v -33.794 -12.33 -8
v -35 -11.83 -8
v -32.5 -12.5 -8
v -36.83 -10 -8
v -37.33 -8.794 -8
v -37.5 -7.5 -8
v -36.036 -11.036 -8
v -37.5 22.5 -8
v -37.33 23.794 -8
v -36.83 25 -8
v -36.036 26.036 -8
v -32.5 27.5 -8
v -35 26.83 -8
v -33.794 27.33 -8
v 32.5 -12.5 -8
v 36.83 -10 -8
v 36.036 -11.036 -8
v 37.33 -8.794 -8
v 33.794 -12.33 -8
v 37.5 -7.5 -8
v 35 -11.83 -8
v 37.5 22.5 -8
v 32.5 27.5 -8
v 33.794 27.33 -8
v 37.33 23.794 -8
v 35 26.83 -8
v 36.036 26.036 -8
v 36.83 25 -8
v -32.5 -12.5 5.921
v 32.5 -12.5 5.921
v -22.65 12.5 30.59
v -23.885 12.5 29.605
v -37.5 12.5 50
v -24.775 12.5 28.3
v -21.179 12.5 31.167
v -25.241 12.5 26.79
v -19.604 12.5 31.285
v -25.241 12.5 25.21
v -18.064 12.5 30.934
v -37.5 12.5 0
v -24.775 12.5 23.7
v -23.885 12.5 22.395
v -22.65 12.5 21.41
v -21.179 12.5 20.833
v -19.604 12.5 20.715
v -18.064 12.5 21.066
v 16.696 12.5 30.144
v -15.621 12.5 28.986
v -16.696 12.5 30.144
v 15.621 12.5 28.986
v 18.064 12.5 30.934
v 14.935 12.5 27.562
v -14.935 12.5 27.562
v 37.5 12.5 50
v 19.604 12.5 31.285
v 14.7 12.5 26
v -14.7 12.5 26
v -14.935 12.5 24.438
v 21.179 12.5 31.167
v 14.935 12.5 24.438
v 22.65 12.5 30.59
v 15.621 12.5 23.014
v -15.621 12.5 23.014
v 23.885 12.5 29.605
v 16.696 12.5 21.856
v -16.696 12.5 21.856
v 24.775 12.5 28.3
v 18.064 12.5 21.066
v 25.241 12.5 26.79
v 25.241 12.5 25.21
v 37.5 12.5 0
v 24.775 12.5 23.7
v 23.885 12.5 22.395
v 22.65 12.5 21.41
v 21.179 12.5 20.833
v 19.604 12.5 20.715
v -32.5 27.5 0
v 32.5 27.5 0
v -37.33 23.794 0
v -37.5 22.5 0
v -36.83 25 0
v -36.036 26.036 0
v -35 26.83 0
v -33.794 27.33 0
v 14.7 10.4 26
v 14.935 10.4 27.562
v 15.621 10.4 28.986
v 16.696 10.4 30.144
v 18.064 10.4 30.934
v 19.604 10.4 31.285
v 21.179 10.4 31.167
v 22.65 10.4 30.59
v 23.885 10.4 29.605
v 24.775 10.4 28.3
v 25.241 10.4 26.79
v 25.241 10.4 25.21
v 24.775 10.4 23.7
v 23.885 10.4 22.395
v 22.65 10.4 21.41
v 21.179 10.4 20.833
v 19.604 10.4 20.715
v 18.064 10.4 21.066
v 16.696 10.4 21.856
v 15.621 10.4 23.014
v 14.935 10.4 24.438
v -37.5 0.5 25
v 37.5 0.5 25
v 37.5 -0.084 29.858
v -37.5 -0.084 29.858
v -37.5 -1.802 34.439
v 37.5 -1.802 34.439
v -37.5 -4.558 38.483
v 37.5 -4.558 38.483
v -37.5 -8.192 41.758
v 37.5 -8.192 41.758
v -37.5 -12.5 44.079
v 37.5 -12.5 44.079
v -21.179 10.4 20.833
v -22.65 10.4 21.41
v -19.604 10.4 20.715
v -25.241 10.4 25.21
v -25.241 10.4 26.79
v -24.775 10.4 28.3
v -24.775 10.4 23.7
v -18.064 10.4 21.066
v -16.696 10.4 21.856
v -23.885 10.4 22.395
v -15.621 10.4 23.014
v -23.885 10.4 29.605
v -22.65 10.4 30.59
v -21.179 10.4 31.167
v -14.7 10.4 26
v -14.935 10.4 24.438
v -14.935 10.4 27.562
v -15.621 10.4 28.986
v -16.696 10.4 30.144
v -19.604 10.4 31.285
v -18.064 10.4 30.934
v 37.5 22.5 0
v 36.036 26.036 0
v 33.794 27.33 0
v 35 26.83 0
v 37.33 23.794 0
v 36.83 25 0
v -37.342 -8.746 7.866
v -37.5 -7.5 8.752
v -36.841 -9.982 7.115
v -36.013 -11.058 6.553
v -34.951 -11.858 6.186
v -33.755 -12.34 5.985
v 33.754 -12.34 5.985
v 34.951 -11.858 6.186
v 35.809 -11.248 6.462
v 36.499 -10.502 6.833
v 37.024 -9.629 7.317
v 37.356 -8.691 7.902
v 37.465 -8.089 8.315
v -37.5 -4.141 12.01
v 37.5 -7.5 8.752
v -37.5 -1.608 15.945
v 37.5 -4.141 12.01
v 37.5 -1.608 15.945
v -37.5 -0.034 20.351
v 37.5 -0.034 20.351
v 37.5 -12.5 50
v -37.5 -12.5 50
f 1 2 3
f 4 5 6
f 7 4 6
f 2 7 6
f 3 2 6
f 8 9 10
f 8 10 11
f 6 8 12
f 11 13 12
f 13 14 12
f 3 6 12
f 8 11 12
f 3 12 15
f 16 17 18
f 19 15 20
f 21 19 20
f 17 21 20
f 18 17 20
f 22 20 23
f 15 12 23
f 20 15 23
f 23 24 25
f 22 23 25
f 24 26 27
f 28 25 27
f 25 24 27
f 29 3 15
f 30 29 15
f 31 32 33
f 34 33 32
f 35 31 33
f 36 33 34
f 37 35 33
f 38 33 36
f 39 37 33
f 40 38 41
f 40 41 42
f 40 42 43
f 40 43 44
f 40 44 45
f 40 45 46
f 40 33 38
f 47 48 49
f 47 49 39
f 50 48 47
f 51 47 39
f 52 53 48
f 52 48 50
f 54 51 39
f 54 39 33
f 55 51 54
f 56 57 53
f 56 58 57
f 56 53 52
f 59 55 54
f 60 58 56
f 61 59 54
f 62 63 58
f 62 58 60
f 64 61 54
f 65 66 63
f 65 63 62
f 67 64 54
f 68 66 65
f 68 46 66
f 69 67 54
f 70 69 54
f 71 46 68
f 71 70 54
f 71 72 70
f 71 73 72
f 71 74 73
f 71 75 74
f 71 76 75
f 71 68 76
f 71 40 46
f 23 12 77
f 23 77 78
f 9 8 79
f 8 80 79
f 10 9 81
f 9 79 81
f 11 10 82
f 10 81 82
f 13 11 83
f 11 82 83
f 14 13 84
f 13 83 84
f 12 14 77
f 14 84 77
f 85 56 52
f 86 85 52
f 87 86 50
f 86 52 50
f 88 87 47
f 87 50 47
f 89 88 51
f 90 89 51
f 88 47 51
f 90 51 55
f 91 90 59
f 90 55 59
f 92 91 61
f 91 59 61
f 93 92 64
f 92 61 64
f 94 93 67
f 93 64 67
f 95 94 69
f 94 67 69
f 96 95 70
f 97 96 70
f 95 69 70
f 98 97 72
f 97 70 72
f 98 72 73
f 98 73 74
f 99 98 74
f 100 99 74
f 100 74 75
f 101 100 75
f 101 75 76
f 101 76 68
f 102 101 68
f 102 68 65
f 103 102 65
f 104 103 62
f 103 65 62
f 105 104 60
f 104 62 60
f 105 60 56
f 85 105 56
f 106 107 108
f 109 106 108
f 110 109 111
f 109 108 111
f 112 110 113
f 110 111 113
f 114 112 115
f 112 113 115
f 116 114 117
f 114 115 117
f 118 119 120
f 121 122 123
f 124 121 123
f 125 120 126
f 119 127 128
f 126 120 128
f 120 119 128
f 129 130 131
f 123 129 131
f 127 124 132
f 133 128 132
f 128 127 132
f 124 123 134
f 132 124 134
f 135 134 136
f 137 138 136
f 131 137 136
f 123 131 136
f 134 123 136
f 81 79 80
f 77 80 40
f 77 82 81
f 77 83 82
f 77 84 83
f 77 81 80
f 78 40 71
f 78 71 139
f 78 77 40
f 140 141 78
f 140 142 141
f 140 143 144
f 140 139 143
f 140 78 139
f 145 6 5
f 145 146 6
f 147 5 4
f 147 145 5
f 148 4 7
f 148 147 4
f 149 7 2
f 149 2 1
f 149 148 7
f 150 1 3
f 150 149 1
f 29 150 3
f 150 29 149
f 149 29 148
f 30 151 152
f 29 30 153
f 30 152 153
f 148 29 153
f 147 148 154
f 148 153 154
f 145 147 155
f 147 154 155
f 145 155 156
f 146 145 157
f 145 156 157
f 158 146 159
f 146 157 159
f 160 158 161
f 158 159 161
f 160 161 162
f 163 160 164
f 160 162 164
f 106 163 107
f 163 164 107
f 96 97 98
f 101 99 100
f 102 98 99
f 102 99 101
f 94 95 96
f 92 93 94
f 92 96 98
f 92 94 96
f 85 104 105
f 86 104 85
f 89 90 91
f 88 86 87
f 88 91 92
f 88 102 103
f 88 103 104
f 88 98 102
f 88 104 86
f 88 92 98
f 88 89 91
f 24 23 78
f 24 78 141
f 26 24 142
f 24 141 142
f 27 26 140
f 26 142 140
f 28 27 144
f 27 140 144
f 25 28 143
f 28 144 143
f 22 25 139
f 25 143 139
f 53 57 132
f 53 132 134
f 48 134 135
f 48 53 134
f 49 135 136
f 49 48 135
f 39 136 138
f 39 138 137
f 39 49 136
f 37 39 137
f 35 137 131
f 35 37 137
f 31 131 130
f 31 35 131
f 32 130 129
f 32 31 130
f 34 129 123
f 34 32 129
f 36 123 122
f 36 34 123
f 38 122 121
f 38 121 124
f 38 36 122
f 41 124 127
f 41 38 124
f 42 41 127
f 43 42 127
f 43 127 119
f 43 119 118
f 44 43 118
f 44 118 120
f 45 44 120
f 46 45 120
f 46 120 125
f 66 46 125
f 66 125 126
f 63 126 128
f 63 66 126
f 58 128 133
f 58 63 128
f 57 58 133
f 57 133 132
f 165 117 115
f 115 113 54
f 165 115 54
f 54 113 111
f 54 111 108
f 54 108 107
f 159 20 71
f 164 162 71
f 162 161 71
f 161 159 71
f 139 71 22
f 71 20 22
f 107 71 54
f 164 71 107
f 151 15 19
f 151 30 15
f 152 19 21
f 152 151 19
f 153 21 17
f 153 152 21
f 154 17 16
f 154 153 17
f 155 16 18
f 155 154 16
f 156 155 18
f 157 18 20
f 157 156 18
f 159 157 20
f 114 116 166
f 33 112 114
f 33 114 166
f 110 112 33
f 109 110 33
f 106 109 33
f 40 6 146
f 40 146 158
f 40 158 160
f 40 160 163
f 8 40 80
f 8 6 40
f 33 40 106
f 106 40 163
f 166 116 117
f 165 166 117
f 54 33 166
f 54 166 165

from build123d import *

# Parameters (mm, degrees)
F0_W      = 75
F0_H      = 25
F1_DEPTH  = 50
F3_DEPTH  = 50
F5_W      = 75
F5_H      = 40
F6_DEPTH  = 8
F9_R      = 5
F10_R     = 5.3
F11_DEPTH = 2.1


with BuildPart() as f1:
    # F0 (on Top) → F1 (new body)
    with BuildSketch(Plane.XY):
        Rectangle(F0_W, F0_H)
    extrude(amount=F1_DEPTH)


with BuildPart() as f3:
    # F2 (on Right) → F3 (new body, symmetric)
    with BuildSketch(Plane.YZ):
        with BuildLine():
            ThreePointArc((-20, 4.5), (-5.5043109857, 10.5043109857), (0.5, 25))
            ThreePointArc((0.5, 25), (-34.4956890143, 39.4956890143), (-20, 4.5))
        make_face()
    extrude(amount=F3_DEPTH, both=True)


with BuildPart() as f1_1:
    add(f1.part)

    # F4: cut F3
    add(f3.part, mode=Mode.SUBTRACT)


with BuildPart() as f6:
    # F5 (on Top) → F6 (new body)
    with BuildSketch(Plane.XY):
        Rectangle(F5_W, F5_H)
    extrude(amount=F6_DEPTH)


with BuildPart() as f6_1:
    # F7: moved
    add(f6.part.moved(Location((0, 7.5, -8))))

    # F8: union F1
    add(f1_1.part)

    # F9
    f9_edges = [f6_1.edges().sort_by_distance(p)[0] for p in [
        (37.5, -12.5, -1.039392),
        (-37.5, -12.5, -1.039392),
        (37.5, 27.5, -4),
        (-37.5, 27.5, -4),
    ]]
    fillet(f9_edges, radius=F9_R)


with BuildPart() as f11:
    # F10 (on Front) → F11 (new body)
    with BuildSketch(Plane.XZ):
        with Locations((-20, 26)):
            Circle(F10_R)
    extrude(amount=F11_DEPTH)


with BuildPart() as f11_1:
    # F12: moved
    add(f11.part.moved(Location((0, 12.5, 0))))


with BuildPart() as f13_1:
    # F13: instance of F11
    add(f11_1.part.mirror(Plane.YZ))


with BuildPart() as f6_2:
    add(f6_1.part)

    # F14: cut F11, F13_1
    add(f11_1.part, mode=Mode.SUBTRACT)
    add(f13_1.part, mode=Mode.SUBTRACT)


solid = f6_2.part
